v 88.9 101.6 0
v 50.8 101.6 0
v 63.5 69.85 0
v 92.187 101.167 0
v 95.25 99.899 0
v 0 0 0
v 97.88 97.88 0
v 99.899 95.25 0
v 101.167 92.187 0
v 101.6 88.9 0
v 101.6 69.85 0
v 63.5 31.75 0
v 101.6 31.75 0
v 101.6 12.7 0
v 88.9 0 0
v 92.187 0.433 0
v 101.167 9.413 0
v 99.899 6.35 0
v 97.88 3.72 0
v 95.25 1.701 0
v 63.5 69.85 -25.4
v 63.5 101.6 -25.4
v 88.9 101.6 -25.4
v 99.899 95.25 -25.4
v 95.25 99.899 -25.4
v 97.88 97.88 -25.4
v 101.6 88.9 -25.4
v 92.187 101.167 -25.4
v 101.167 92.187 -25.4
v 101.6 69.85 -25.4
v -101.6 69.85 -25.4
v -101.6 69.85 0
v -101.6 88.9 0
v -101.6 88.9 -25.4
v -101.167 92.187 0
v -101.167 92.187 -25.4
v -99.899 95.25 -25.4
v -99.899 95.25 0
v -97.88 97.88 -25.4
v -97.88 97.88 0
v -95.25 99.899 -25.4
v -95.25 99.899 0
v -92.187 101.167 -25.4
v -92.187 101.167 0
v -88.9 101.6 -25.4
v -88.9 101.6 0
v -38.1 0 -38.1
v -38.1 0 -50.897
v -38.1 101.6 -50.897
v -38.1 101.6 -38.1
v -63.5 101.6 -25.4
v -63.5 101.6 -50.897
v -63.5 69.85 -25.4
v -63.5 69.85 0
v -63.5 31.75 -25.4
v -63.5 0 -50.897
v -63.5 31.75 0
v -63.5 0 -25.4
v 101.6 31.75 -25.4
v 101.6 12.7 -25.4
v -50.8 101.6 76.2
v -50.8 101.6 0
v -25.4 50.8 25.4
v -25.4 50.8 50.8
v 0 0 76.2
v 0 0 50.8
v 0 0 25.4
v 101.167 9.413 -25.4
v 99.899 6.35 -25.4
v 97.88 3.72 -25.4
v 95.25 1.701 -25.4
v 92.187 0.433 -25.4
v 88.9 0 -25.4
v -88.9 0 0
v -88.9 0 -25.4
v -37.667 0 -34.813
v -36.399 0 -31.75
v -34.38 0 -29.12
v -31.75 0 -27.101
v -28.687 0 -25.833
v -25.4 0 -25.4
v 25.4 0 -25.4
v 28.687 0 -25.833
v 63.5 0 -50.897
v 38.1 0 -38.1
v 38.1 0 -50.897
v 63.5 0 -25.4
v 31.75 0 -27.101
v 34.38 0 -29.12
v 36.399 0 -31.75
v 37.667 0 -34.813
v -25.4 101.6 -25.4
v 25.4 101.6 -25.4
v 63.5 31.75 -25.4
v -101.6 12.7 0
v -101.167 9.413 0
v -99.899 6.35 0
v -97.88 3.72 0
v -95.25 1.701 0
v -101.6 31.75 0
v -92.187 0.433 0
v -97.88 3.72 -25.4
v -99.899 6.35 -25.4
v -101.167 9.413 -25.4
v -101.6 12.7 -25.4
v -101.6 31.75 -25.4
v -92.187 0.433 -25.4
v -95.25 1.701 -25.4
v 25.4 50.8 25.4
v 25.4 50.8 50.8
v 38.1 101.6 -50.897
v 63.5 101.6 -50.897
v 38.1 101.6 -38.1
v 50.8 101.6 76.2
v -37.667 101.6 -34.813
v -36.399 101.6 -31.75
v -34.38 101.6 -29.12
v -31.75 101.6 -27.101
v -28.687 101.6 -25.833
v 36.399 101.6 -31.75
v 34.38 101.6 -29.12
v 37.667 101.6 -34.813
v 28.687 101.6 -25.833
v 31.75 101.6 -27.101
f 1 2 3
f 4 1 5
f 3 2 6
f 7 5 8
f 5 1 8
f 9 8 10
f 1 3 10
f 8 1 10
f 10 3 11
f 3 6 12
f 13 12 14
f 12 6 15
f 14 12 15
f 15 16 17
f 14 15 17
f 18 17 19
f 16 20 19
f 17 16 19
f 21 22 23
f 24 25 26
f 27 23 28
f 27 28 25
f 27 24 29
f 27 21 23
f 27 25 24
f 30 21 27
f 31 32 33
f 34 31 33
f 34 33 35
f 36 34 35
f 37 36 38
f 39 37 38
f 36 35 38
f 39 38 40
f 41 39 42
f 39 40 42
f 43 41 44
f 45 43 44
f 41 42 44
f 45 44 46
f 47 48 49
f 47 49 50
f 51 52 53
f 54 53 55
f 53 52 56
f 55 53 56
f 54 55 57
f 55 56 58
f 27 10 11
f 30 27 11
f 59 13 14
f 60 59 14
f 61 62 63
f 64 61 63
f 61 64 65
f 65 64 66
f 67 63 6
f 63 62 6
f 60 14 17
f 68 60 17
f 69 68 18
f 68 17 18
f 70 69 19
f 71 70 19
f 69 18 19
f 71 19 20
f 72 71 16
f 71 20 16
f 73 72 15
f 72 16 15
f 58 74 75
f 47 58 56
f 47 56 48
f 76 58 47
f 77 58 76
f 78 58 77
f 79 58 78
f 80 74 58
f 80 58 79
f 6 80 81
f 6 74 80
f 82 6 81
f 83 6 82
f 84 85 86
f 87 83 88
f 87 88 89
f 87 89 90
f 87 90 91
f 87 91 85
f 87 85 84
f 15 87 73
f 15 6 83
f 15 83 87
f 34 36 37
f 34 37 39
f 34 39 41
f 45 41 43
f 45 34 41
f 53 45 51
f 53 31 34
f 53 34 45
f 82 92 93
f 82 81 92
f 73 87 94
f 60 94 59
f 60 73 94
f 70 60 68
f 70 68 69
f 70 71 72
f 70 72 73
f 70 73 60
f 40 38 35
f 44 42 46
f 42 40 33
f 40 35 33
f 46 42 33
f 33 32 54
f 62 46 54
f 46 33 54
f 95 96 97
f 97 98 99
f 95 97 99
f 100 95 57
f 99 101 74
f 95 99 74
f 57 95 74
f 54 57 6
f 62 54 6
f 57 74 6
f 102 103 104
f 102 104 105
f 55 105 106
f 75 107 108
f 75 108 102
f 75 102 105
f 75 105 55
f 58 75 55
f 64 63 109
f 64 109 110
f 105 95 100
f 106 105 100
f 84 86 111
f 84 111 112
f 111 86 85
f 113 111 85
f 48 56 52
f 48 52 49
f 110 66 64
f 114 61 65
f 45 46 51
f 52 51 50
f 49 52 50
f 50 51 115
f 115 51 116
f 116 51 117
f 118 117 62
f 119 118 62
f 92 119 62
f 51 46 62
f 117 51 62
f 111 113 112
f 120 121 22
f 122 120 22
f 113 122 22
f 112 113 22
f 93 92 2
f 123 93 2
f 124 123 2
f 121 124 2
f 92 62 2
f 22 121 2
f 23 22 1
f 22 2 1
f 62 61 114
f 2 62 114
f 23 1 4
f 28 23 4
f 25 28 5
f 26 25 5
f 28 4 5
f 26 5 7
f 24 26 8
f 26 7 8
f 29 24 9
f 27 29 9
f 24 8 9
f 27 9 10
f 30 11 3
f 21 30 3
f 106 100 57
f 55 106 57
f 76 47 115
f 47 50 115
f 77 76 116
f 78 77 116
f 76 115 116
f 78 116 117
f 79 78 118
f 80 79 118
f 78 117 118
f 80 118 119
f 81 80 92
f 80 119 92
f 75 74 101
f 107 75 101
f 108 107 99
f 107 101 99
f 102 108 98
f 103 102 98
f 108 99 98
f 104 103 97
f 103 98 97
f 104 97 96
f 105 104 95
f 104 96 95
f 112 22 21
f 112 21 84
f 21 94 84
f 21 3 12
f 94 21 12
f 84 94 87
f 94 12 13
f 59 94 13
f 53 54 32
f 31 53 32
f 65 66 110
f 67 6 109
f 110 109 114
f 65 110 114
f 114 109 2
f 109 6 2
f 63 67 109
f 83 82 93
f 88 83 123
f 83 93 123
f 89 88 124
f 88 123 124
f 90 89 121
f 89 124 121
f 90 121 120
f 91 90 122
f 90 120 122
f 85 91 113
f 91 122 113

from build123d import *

# Parameters (mm, degrees)
F1_DEPTH      = 76.2
F2_W          = 50.8
F2_H          = 25.4
F3_DEPTH      = 50.801
F3_DEPTH_BACK = 50.801
F5_DEPTH      = 25.4
F6_DEPTH      = 25.4
F7_W          = 25.4
F7_H          = 25.4968867362
F8_DEPTH      = 101.6
F9_R          = 12.7


with BuildPart() as f1:
    # F0 (on Top) → F1 (new body)
    with BuildSketch(Plane.XY):
        Polygon((-50.8, 101.6), (0, 0), (50.8, 101.6), align=None)
    extrude(amount=F1_DEPTH)

    # F2 (on Right) → F3 (cut, two sides)
    with BuildSketch(Plane.YZ) as f3_sk:
        with Locations((25.4, 38.1)):
            Rectangle(F2_W, F2_H)
    extrude(amount=-F3_DEPTH, mode=Mode.SUBTRACT)
    extrude(f3_sk.sketch, amount=F3_DEPTH_BACK, mode=Mode.SUBTRACT)

    # F4 (on face) → F5 (join)
    with BuildSketch(Plane(origin=(0, 0, 0), x_dir=(1, 0, 0), z_dir=(0, 0, -1))):
        with BuildLine():
            Line((63.5, -31.75), (101.6, -31.75))
            Line((101.6, -31.75), (101.6, -12.7))
            ThreePointArc((101.6, -12.7), (97.8802561211, -3.7197438789), (88.9, 0))
            Line((88.9, 0), (-88.9, 0))
            ThreePointArc((-88.9, 0), (-97.8802561211, -3.7197438789), (-101.6, -12.7))
            Line((-101.6, -12.7), (-101.6, -31.75))
            Line((-101.6, -31.75), (-63.5, -31.75))
            Line((-63.5, -31.75), (-63.5, -69.85))
            Line((-63.5, -69.85), (-101.6, -69.85))
            Line((-101.6, -69.85), (-101.6, -88.9))
            ThreePointArc((-101.6, -88.9), (-97.8802561211, -97.8802561211), (-88.9, -101.6))
            Line((-88.9, -101.6), (-50.8, -101.6))
            Line((-50.8, -101.6), (50.8, -101.6))
            Line((50.8, -101.6), (88.9, -101.6))
            ThreePointArc((88.9, -101.6), (97.8802561211, -97.8802561211), (101.6, -88.9))
            Line((101.6, -88.9), (101.6, -69.85))
            Line((101.6, -69.85), (63.5, -69.85))
            Line((63.5, -69.85), (63.5, -31.75))
        make_face()
    extrude(amount=F5_DEPTH)

    # F4 (on face) → F6 (join)
    with BuildSketch(Plane(origin=(0, 0, 0), x_dir=(1, 0, 0), z_dir=(0, 0, -1))):
        with BuildLine():
            Line((63.5, -31.75), (101.6, -31.75))
            Line((101.6, -31.75), (101.6, -12.7))
            ThreePointArc((101.6, -12.7), (97.8802561211, -3.7197438789), (88.9, 0))
            Line((88.9, 0), (-88.9, 0))
            ThreePointArc((-88.9, 0), (-97.8802561211, -3.7197438789), (-101.6, -12.7))
            Line((-101.6, -12.7), (-101.6, -31.75))
            Line((-101.6, -31.75), (-63.5, -31.75))
            Line((-63.5, -31.75), (-63.5, -69.85))
            Line((-63.5, -69.85), (-101.6, -69.85))
            Line((-101.6, -69.85), (-101.6, -88.9))
            ThreePointArc((-101.6, -88.9), (-97.8802561211, -97.8802561211), (-88.9, -101.6))
            Line((-88.9, -101.6), (-50.8, -101.6))
            Line((-50.8, -101.6), (50.8, -101.6))
            Line((50.8, -101.6), (88.9, -101.6))
            ThreePointArc((88.9, -101.6), (97.8802561211, -97.8802561211), (101.6, -88.9))
            Line((101.6, -88.9), (101.6, -69.85))
            Line((101.6, -69.85), (63.5, -69.85))
            Line((63.5, -69.85), (63.5, -31.75))
        make_face()
    extrude(amount=F6_DEPTH)

    # F7 (on face) → F8 (join)
    with BuildSketch(Plane.XZ):
        with Locations((-50.8, -38.1484433681)):
            Rectangle(F7_W, F7_H)
        with Locations((50.8, -38.1484433681)):
            Rectangle(F7_W, F7_H)
    extrude(amount=-F8_DEPTH)

    # F9
    f9_edges = [f1.edges().sort_by_distance(p)[0] for p in [
        (-38.1, 50.8, -25.4),
        (38.1, 50.8, -25.4),
    ]]
    fillet(f9_edges, radius=F9_R)


solid = f1.part
